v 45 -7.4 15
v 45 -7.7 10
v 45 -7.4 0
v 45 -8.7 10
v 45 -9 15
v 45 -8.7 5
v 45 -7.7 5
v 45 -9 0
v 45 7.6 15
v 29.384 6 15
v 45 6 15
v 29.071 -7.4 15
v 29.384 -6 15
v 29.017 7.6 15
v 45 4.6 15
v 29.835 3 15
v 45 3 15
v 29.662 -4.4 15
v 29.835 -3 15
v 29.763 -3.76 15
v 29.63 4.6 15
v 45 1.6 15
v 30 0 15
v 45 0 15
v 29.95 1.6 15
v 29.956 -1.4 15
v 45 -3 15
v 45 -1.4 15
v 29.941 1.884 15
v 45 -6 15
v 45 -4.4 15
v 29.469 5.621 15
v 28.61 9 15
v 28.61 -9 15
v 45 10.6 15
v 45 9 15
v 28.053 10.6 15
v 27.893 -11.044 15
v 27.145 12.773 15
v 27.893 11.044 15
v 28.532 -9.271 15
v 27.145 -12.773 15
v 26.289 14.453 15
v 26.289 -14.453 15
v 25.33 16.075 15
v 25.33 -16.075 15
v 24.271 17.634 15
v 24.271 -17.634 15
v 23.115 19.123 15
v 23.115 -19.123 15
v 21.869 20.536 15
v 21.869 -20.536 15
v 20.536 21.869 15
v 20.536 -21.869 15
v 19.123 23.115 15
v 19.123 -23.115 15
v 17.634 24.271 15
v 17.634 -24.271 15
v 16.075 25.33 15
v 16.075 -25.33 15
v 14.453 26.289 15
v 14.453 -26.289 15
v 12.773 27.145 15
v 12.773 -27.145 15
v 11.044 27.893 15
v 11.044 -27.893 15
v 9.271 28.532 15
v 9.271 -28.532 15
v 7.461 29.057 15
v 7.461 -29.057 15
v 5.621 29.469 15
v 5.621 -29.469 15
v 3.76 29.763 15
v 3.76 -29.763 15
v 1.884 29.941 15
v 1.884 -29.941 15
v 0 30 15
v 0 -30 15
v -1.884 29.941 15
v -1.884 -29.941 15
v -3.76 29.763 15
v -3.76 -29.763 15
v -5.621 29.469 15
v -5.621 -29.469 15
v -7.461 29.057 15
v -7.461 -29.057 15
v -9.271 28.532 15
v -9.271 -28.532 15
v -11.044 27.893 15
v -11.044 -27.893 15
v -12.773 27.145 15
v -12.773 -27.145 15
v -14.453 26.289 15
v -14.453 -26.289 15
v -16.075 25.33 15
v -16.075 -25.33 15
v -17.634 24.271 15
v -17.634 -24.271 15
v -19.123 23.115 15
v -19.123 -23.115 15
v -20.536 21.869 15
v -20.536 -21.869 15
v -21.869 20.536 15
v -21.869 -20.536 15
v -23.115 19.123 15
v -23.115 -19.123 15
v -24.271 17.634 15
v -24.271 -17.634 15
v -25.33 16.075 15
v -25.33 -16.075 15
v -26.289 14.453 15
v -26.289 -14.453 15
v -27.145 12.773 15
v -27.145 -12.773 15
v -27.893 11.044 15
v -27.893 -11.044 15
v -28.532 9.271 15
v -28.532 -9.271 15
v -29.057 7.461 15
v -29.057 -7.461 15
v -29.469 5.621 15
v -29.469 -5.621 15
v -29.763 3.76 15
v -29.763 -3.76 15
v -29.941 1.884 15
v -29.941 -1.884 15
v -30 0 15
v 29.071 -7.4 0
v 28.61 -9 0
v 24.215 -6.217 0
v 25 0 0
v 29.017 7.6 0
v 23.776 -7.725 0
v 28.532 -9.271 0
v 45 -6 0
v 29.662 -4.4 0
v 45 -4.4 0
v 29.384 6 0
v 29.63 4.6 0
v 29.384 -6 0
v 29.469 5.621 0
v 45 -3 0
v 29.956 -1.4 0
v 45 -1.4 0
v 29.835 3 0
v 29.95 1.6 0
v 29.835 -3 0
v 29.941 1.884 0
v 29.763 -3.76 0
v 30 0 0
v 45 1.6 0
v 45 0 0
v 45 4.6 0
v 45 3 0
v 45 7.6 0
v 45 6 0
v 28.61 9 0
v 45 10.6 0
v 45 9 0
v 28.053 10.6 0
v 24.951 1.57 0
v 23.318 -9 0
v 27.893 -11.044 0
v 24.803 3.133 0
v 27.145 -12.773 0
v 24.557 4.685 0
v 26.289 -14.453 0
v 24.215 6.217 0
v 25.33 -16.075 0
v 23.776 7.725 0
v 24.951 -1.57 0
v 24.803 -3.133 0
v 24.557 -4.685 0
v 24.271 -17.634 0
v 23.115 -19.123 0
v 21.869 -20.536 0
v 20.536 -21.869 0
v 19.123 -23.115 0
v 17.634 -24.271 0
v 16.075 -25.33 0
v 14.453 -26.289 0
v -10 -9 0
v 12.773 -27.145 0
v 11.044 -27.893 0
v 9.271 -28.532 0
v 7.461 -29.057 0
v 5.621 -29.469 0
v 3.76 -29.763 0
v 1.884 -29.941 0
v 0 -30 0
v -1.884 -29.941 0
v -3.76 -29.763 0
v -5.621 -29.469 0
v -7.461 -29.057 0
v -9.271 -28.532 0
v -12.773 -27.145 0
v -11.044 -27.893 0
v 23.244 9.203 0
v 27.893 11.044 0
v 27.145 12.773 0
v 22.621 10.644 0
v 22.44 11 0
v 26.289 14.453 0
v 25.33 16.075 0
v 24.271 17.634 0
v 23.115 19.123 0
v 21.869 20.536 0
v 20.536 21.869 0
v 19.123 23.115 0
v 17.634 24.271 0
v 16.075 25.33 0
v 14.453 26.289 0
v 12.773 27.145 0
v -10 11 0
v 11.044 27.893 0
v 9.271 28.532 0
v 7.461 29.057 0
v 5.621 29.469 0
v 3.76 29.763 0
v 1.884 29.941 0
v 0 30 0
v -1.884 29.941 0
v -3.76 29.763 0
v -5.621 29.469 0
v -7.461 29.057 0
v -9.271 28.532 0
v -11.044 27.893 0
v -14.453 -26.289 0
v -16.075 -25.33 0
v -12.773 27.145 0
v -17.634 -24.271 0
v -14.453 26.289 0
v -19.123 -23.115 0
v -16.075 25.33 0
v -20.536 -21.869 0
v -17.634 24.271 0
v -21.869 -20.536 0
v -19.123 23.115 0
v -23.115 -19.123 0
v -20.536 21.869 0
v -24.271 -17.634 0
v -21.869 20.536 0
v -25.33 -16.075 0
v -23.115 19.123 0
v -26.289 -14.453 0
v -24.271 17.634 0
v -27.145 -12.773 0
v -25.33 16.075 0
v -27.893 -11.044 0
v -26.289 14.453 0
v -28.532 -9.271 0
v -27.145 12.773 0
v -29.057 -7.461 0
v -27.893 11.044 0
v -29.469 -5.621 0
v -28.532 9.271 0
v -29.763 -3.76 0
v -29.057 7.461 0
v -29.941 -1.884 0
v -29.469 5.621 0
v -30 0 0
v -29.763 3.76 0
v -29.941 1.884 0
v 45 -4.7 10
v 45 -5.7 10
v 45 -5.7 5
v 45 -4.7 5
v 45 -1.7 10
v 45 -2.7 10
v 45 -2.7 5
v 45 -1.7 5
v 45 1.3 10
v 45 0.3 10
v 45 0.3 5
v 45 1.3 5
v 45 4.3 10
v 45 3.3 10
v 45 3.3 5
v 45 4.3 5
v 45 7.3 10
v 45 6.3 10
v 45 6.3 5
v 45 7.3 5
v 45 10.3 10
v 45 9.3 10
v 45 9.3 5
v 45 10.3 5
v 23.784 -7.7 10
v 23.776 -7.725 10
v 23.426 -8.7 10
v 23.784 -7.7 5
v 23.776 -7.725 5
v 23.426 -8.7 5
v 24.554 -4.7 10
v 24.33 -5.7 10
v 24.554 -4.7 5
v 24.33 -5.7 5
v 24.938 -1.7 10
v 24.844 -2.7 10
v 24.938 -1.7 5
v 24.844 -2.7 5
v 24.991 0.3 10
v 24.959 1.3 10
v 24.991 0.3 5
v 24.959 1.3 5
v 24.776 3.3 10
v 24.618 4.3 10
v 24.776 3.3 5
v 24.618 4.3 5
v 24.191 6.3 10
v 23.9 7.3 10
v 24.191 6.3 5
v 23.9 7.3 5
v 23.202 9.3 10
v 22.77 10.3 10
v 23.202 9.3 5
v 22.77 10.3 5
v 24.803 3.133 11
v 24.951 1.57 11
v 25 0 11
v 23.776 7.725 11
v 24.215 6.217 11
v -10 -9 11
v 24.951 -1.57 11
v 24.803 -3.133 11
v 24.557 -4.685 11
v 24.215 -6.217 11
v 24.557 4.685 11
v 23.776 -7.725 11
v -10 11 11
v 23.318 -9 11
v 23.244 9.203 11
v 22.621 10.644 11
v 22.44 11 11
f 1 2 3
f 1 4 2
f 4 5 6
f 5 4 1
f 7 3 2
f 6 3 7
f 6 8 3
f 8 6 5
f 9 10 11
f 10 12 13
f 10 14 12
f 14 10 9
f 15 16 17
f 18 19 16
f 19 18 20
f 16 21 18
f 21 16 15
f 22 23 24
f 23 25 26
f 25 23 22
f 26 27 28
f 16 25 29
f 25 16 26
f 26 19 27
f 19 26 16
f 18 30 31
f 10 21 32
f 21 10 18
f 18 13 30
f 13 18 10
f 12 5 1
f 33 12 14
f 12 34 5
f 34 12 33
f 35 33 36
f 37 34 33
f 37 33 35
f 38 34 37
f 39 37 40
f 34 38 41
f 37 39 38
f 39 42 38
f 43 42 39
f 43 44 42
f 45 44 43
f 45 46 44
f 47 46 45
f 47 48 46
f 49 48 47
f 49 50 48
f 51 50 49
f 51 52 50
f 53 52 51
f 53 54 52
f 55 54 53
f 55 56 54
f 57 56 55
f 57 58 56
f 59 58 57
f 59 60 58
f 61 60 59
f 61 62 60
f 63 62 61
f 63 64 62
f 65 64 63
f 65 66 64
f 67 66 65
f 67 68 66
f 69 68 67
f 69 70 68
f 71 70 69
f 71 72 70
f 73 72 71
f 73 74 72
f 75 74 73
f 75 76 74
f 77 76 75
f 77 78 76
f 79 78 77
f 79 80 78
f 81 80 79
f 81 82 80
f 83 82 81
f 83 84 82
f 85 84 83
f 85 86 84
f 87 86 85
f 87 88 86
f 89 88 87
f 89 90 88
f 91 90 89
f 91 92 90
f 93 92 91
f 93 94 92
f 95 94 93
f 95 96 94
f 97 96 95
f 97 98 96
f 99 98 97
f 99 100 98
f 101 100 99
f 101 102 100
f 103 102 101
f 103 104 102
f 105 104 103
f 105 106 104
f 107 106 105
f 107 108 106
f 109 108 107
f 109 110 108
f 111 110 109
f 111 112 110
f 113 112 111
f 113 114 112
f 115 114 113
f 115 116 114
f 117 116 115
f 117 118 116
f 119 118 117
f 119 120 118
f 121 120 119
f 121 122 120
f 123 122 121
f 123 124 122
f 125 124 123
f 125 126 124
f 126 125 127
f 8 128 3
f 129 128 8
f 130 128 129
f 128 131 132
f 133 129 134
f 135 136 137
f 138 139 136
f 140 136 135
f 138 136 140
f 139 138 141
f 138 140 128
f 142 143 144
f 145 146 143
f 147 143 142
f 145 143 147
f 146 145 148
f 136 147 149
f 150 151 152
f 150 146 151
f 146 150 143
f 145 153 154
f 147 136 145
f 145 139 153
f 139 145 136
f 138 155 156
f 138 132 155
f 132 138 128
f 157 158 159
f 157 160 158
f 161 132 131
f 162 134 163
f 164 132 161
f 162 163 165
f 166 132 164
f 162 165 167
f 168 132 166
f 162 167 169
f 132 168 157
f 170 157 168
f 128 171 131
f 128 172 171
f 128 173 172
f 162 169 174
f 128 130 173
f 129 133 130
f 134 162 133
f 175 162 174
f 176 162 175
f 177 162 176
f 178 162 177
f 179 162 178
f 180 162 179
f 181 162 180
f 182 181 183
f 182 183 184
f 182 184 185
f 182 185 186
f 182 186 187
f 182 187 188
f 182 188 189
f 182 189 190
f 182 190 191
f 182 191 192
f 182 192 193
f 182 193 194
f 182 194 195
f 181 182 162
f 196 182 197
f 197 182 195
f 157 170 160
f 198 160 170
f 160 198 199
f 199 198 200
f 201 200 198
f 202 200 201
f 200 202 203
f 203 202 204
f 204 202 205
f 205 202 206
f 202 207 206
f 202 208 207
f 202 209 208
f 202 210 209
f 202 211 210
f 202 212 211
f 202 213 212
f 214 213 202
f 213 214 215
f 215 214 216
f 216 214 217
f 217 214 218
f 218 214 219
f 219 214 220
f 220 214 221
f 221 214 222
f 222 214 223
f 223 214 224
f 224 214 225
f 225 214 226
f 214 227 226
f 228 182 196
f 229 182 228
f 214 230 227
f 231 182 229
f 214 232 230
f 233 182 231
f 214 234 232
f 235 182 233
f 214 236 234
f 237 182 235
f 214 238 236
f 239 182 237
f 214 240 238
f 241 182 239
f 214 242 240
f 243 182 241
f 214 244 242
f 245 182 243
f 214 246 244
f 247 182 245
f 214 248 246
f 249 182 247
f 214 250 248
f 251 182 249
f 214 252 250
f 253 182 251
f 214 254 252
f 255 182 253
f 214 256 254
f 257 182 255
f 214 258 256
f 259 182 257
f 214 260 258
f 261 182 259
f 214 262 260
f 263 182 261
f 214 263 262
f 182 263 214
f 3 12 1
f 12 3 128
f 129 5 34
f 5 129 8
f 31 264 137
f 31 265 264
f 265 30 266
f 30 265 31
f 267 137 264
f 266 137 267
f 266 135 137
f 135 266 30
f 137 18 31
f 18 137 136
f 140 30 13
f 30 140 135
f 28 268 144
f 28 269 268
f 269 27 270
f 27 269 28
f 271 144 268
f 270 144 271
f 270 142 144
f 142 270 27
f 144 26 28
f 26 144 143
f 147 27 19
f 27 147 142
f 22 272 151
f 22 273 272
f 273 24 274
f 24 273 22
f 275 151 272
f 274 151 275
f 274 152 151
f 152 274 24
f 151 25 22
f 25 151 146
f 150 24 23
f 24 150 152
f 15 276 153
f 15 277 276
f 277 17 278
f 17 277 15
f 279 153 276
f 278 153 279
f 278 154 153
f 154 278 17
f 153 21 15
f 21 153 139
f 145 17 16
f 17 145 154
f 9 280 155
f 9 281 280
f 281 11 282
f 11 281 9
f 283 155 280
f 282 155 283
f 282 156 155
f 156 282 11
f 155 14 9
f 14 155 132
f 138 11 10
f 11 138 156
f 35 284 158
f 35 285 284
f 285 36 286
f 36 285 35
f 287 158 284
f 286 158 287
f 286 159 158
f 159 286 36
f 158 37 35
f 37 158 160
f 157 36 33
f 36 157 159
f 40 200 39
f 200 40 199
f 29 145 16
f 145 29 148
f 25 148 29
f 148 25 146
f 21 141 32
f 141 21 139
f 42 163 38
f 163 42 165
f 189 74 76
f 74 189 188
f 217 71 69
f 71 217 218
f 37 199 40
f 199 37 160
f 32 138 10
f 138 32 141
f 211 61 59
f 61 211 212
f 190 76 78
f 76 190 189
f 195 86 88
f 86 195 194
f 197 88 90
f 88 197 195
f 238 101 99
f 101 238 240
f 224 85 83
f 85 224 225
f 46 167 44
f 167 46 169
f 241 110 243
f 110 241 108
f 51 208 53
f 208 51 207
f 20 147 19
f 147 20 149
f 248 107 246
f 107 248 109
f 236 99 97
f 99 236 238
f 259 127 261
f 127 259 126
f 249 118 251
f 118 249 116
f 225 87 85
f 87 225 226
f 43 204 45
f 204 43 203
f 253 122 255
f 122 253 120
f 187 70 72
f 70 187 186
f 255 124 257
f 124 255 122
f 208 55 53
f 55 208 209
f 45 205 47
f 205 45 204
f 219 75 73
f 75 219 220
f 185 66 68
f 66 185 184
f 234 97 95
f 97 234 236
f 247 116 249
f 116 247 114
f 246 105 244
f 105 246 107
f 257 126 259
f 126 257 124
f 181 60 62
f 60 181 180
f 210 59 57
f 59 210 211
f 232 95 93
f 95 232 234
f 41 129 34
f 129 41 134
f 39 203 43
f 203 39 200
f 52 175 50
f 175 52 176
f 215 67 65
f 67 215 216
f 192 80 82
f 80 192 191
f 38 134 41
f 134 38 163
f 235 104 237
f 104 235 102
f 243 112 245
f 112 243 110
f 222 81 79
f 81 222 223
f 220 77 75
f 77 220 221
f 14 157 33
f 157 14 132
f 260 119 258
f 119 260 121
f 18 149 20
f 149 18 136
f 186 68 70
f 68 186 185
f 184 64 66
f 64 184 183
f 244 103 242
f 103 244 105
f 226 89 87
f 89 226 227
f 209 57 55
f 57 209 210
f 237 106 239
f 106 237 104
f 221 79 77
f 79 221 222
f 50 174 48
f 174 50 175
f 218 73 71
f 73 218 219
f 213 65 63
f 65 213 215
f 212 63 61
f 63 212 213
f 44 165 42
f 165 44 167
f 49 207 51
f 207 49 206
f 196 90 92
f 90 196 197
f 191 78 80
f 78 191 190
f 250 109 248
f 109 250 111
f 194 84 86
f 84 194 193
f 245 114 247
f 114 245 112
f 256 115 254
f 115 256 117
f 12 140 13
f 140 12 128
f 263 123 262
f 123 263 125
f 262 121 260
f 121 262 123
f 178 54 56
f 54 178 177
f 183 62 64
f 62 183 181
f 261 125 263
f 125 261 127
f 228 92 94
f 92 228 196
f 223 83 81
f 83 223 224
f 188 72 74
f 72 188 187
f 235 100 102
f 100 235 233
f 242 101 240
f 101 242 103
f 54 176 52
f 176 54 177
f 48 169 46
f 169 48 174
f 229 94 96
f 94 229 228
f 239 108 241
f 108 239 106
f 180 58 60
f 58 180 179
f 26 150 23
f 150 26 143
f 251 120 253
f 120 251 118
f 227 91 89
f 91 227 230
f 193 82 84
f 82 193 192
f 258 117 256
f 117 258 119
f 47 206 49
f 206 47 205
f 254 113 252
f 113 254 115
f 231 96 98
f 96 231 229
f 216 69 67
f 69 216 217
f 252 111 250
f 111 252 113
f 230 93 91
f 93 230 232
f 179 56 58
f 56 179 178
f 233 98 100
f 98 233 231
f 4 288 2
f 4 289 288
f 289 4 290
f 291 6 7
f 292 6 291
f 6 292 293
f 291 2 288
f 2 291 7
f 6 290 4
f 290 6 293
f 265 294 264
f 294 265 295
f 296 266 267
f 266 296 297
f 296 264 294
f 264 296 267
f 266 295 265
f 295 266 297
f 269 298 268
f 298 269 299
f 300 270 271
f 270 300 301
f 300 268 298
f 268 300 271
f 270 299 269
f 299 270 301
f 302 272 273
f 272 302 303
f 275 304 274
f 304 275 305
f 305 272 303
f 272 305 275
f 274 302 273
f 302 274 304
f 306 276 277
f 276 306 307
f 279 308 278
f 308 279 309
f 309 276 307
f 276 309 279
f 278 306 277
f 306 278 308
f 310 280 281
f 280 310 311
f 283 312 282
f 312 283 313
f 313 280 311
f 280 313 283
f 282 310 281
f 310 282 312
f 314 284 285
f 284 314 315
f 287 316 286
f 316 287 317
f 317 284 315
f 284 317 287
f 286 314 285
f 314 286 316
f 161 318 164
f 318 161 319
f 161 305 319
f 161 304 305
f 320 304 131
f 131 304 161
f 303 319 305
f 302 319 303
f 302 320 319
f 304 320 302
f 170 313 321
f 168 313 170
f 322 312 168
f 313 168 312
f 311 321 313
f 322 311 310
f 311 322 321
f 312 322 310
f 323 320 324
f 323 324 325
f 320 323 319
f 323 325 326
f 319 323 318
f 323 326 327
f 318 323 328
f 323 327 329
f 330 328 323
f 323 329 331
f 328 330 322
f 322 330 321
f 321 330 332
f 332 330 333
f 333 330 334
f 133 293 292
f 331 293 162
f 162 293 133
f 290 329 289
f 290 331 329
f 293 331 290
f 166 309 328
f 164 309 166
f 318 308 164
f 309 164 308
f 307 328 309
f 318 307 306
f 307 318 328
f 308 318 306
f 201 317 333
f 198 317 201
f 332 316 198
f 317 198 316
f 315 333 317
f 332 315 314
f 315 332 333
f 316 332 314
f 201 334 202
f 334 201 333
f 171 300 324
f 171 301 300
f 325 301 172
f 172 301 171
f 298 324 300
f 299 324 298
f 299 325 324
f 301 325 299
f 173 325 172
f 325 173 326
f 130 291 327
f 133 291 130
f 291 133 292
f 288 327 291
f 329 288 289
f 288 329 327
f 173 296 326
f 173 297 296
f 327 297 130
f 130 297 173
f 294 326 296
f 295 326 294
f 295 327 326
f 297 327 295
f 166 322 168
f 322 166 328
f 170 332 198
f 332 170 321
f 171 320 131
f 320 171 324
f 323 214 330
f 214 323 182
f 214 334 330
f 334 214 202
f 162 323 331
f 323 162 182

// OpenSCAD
render(convexity = 4) {
  difference() {
    union() {
      cylinder(h = 15, r=30, $fn=100);
      for (f = [-9 : 3 : 9]) {
        translate([25,f,0])
          cube([20, 1.6, 15]);
      }
    }
    union () {
      for (f = [-8.7 : 3 : 9.3]) {
        translate([20,f,5])
          cube([30, 1, 5]);
      }
      intersection() {
        cylinder(h = 11, r=25, $fn=100);
        translate([-10, -9, 0])
          cube([40, 20, 11]);
      }
    }
  }
}
